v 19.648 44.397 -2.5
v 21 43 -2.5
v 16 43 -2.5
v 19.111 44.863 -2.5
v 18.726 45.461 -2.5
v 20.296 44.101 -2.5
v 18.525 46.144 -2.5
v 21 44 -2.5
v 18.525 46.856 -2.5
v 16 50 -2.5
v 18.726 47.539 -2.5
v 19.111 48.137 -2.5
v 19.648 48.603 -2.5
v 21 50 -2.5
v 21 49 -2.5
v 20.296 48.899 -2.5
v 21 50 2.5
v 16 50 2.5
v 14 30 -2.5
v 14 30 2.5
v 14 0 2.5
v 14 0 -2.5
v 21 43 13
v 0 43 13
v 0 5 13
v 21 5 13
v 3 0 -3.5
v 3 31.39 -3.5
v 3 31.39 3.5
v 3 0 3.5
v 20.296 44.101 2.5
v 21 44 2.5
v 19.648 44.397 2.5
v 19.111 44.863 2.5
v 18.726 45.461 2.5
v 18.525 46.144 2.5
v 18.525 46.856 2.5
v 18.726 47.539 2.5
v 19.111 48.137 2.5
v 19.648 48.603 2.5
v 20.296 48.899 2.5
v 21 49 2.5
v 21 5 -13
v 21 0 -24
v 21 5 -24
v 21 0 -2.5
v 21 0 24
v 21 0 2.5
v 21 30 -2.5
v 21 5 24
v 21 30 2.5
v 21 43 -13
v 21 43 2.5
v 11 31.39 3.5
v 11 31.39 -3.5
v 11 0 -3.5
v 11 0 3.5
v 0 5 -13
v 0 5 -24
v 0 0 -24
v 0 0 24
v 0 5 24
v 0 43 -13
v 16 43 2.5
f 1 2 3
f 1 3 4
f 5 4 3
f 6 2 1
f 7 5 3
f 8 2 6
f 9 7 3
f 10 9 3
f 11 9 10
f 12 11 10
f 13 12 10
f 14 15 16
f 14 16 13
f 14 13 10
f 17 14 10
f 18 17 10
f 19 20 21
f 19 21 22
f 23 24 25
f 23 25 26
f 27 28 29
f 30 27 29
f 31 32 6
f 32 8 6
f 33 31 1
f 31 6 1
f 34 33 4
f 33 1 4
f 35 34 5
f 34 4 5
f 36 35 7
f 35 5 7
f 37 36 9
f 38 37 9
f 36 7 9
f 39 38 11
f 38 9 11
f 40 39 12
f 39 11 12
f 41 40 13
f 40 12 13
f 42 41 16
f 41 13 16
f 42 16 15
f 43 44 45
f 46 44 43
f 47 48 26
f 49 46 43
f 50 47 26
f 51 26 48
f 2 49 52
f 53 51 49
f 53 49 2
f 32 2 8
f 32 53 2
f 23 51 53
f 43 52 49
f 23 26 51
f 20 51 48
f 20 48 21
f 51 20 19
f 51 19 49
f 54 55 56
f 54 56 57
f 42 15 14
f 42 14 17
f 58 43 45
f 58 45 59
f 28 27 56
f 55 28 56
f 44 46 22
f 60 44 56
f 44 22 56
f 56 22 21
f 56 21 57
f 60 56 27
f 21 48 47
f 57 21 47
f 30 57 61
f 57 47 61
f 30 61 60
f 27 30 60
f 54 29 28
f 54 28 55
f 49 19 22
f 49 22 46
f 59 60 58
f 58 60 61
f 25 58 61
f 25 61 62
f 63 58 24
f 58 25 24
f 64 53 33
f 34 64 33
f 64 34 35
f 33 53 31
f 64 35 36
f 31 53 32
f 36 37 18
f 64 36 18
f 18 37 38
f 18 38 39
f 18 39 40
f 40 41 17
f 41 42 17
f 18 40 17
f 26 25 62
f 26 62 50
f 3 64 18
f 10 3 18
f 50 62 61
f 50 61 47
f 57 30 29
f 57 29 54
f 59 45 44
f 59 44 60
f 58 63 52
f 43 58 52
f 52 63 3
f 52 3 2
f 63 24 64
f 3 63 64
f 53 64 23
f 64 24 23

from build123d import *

# Parameters (mm, degrees)
EXTRUDE_1_DEPTH          = 50
SKETCH_3_W               = 8
SKETCH_3_H               = 7
CUT_EXTRUDE_1_DEPTH      = 31.389642439
CUT_EXTRUDE_2_DEPTH      = 55.893077888
CUT_EXTRUDE_2_DEPTH_BACK = 30
SKETCH_15_W              = 6
SKETCH_15_H              = 7
CUT_EXTRUDE_10_DEPTH     = 30
SKETCH_16_W              = 16
SKETCH_16_H              = 7
SKETCH_16_W_2            = 6.921662606
CUT_EXTRUDE_11_DEPTH     = 30
SKETCH_18_R              = 2.5
CUT_EXTRUDE_12_DEPTH     = 30
SKETCH_19_W              = 21
SKETCH_19_H              = 3
CUT_EXTRUDE_14_DEPTH     = 50
SKETCH_20_W              = 4
SKETCH_20_H              = 6.019641958
CUT_EXTRUDE_16_DEPTH     = 50
EXTRUDE_START            = -43
SKETCH_21_W              = 21
SKETCH_21_H              = 7.5
EXTRUDE_3_DEPTH          = 43
SKETCH_22_W              = 21
SKETCH_22_H              = 5
EXTRUDE_4_DEPTH          = 11
SKETCH_23_W              = 21
SKETCH_23_H              = 5
EXTRUDE_5_DEPTH          = 11


with BuildPart() as part:
    # 草图1 → 凸台-拉伸1 (new body)
    with BuildSketch(Plane(origin=(0, 0, 0), x_dir=(1, 0, 0), z_dir=(0, 1, 0))):
        Polygon((0, -8.5), (0, -1), (-2, -1), (-2, -3), (-4, -3), (-4, 3), (-2, 3), (-2, 1), (0, 1), (0, 8.5), (21, 8.5), (21, -8.5), align=None)
    extrude(amount=EXTRUDE_1_DEPTH)

    # 草图3 → 切除-拉伸1 (cut)
    with BuildSketch(Plane.XZ):
        with Locations((7, 0)):
            Rectangle(SKETCH_3_W, SKETCH_3_H)
    extrude(amount=-CUT_EXTRUDE_1_DEPTH, mode=Mode.SUBTRACT)

    # 草图6 → 切除-拉伸2 (cut, two sides: drawn at the far end of the back side and taken through both)
    with BuildSketch(Plane.XZ.offset(-CUT_EXTRUDE_2_DEPTH_BACK)):
        Polygon((21, -2.405859061), (21, 0), (21, 2.5), (14, 2.5), (14, -2.5), (21, -2.5), align=None)
    extrude(amount=CUT_EXTRUDE_2_DEPTH + CUT_EXTRUDE_2_DEPTH_BACK, mode=Mode.SUBTRACT)

    # 草图15 → 切除-拉伸10 (cut)
    with BuildSketch(Plane(origin=(21, 0, 0), x_dir=(0, 0, -1), z_dir=(1, 0, 0))):
        with Locations((-5.5, 46.5)):
            Rectangle(SKETCH_15_W, SKETCH_15_H)
        with Locations((5.5, 46.5)):
            Rectangle(SKETCH_15_W, SKETCH_15_H)
    extrude(amount=-CUT_EXTRUDE_10_DEPTH, mode=Mode.SUBTRACT)

    # 草图16 → 切除-拉伸11 (cut)
    with BuildSketch(Plane.XY.offset(2.5)):
        with Locations((8, 46.5)):
            Rectangle(SKETCH_16_W, SKETCH_16_H)
        with Locations((-3.460831303, 46.5)):
            Rectangle(SKETCH_16_W_2, SKETCH_16_H)
    extrude(amount=-CUT_EXTRUDE_11_DEPTH, mode=Mode.SUBTRACT)

    # 草图18 → 切除-拉伸12 (cut)
    with BuildSketch(Plane(origin=(0, 0, -2.5), x_dir=(-1, 0, 0), z_dir=(0, 0, -1))):
        with Locations((-21, 46.5)):
            Circle(SKETCH_18_R)
    extrude(amount=-CUT_EXTRUDE_12_DEPTH, mode=Mode.SUBTRACT)

    # 草图19 → 切除-拉伸14 (cut)
    with BuildSketch(Plane(origin=(0, 0, 0), x_dir=(-1, 0, 0), z_dir=(0, -1, 0))):
        with Locations((-10.5, -7)):
            Rectangle(SKETCH_19_W, SKETCH_19_H)
        with Locations((-10.5, 7)):
            Rectangle(SKETCH_19_W, SKETCH_19_H)
    extrude(amount=-CUT_EXTRUDE_14_DEPTH, mode=Mode.SUBTRACT)

    # 草图20 → 切除-拉伸16 (cut)
    with BuildSketch(Plane.XZ):
        with Locations((-2, -0.009820979)):
            Rectangle(SKETCH_20_W, SKETCH_20_H)
    extrude(amount=-CUT_EXTRUDE_16_DEPTH, mode=Mode.SUBTRACT)

    # 草图21 → 凸台-拉伸3 (add)
    with BuildSketch(Plane.XZ.offset(EXTRUDE_START)):
        with Locations((10.5, -9.25)):
            Rectangle(SKETCH_21_W, SKETCH_21_H)
        with Locations((10.5, 9.25)):
            Rectangle(SKETCH_21_W, SKETCH_21_H)
    extrude(amount=EXTRUDE_3_DEPTH)

    # 草图22 → 凸台-拉伸4 (add)
    with BuildSketch(Plane.XY.offset(13)):
        with Locations((10.5, 2.5)):
            Rectangle(SKETCH_22_W, SKETCH_22_H)
    extrude(amount=EXTRUDE_4_DEPTH)

    # 草图23 → 凸台-拉伸5 (add)
    with BuildSketch(Plane(origin=(0, 0, -13), x_dir=(-1, 0, 0), z_dir=(0, 0, -1))):
        with Locations((-10.5, 2.5)):
            Rectangle(SKETCH_23_W, SKETCH_23_H)
    extrude(amount=EXTRUDE_5_DEPTH)


solid = part.part
